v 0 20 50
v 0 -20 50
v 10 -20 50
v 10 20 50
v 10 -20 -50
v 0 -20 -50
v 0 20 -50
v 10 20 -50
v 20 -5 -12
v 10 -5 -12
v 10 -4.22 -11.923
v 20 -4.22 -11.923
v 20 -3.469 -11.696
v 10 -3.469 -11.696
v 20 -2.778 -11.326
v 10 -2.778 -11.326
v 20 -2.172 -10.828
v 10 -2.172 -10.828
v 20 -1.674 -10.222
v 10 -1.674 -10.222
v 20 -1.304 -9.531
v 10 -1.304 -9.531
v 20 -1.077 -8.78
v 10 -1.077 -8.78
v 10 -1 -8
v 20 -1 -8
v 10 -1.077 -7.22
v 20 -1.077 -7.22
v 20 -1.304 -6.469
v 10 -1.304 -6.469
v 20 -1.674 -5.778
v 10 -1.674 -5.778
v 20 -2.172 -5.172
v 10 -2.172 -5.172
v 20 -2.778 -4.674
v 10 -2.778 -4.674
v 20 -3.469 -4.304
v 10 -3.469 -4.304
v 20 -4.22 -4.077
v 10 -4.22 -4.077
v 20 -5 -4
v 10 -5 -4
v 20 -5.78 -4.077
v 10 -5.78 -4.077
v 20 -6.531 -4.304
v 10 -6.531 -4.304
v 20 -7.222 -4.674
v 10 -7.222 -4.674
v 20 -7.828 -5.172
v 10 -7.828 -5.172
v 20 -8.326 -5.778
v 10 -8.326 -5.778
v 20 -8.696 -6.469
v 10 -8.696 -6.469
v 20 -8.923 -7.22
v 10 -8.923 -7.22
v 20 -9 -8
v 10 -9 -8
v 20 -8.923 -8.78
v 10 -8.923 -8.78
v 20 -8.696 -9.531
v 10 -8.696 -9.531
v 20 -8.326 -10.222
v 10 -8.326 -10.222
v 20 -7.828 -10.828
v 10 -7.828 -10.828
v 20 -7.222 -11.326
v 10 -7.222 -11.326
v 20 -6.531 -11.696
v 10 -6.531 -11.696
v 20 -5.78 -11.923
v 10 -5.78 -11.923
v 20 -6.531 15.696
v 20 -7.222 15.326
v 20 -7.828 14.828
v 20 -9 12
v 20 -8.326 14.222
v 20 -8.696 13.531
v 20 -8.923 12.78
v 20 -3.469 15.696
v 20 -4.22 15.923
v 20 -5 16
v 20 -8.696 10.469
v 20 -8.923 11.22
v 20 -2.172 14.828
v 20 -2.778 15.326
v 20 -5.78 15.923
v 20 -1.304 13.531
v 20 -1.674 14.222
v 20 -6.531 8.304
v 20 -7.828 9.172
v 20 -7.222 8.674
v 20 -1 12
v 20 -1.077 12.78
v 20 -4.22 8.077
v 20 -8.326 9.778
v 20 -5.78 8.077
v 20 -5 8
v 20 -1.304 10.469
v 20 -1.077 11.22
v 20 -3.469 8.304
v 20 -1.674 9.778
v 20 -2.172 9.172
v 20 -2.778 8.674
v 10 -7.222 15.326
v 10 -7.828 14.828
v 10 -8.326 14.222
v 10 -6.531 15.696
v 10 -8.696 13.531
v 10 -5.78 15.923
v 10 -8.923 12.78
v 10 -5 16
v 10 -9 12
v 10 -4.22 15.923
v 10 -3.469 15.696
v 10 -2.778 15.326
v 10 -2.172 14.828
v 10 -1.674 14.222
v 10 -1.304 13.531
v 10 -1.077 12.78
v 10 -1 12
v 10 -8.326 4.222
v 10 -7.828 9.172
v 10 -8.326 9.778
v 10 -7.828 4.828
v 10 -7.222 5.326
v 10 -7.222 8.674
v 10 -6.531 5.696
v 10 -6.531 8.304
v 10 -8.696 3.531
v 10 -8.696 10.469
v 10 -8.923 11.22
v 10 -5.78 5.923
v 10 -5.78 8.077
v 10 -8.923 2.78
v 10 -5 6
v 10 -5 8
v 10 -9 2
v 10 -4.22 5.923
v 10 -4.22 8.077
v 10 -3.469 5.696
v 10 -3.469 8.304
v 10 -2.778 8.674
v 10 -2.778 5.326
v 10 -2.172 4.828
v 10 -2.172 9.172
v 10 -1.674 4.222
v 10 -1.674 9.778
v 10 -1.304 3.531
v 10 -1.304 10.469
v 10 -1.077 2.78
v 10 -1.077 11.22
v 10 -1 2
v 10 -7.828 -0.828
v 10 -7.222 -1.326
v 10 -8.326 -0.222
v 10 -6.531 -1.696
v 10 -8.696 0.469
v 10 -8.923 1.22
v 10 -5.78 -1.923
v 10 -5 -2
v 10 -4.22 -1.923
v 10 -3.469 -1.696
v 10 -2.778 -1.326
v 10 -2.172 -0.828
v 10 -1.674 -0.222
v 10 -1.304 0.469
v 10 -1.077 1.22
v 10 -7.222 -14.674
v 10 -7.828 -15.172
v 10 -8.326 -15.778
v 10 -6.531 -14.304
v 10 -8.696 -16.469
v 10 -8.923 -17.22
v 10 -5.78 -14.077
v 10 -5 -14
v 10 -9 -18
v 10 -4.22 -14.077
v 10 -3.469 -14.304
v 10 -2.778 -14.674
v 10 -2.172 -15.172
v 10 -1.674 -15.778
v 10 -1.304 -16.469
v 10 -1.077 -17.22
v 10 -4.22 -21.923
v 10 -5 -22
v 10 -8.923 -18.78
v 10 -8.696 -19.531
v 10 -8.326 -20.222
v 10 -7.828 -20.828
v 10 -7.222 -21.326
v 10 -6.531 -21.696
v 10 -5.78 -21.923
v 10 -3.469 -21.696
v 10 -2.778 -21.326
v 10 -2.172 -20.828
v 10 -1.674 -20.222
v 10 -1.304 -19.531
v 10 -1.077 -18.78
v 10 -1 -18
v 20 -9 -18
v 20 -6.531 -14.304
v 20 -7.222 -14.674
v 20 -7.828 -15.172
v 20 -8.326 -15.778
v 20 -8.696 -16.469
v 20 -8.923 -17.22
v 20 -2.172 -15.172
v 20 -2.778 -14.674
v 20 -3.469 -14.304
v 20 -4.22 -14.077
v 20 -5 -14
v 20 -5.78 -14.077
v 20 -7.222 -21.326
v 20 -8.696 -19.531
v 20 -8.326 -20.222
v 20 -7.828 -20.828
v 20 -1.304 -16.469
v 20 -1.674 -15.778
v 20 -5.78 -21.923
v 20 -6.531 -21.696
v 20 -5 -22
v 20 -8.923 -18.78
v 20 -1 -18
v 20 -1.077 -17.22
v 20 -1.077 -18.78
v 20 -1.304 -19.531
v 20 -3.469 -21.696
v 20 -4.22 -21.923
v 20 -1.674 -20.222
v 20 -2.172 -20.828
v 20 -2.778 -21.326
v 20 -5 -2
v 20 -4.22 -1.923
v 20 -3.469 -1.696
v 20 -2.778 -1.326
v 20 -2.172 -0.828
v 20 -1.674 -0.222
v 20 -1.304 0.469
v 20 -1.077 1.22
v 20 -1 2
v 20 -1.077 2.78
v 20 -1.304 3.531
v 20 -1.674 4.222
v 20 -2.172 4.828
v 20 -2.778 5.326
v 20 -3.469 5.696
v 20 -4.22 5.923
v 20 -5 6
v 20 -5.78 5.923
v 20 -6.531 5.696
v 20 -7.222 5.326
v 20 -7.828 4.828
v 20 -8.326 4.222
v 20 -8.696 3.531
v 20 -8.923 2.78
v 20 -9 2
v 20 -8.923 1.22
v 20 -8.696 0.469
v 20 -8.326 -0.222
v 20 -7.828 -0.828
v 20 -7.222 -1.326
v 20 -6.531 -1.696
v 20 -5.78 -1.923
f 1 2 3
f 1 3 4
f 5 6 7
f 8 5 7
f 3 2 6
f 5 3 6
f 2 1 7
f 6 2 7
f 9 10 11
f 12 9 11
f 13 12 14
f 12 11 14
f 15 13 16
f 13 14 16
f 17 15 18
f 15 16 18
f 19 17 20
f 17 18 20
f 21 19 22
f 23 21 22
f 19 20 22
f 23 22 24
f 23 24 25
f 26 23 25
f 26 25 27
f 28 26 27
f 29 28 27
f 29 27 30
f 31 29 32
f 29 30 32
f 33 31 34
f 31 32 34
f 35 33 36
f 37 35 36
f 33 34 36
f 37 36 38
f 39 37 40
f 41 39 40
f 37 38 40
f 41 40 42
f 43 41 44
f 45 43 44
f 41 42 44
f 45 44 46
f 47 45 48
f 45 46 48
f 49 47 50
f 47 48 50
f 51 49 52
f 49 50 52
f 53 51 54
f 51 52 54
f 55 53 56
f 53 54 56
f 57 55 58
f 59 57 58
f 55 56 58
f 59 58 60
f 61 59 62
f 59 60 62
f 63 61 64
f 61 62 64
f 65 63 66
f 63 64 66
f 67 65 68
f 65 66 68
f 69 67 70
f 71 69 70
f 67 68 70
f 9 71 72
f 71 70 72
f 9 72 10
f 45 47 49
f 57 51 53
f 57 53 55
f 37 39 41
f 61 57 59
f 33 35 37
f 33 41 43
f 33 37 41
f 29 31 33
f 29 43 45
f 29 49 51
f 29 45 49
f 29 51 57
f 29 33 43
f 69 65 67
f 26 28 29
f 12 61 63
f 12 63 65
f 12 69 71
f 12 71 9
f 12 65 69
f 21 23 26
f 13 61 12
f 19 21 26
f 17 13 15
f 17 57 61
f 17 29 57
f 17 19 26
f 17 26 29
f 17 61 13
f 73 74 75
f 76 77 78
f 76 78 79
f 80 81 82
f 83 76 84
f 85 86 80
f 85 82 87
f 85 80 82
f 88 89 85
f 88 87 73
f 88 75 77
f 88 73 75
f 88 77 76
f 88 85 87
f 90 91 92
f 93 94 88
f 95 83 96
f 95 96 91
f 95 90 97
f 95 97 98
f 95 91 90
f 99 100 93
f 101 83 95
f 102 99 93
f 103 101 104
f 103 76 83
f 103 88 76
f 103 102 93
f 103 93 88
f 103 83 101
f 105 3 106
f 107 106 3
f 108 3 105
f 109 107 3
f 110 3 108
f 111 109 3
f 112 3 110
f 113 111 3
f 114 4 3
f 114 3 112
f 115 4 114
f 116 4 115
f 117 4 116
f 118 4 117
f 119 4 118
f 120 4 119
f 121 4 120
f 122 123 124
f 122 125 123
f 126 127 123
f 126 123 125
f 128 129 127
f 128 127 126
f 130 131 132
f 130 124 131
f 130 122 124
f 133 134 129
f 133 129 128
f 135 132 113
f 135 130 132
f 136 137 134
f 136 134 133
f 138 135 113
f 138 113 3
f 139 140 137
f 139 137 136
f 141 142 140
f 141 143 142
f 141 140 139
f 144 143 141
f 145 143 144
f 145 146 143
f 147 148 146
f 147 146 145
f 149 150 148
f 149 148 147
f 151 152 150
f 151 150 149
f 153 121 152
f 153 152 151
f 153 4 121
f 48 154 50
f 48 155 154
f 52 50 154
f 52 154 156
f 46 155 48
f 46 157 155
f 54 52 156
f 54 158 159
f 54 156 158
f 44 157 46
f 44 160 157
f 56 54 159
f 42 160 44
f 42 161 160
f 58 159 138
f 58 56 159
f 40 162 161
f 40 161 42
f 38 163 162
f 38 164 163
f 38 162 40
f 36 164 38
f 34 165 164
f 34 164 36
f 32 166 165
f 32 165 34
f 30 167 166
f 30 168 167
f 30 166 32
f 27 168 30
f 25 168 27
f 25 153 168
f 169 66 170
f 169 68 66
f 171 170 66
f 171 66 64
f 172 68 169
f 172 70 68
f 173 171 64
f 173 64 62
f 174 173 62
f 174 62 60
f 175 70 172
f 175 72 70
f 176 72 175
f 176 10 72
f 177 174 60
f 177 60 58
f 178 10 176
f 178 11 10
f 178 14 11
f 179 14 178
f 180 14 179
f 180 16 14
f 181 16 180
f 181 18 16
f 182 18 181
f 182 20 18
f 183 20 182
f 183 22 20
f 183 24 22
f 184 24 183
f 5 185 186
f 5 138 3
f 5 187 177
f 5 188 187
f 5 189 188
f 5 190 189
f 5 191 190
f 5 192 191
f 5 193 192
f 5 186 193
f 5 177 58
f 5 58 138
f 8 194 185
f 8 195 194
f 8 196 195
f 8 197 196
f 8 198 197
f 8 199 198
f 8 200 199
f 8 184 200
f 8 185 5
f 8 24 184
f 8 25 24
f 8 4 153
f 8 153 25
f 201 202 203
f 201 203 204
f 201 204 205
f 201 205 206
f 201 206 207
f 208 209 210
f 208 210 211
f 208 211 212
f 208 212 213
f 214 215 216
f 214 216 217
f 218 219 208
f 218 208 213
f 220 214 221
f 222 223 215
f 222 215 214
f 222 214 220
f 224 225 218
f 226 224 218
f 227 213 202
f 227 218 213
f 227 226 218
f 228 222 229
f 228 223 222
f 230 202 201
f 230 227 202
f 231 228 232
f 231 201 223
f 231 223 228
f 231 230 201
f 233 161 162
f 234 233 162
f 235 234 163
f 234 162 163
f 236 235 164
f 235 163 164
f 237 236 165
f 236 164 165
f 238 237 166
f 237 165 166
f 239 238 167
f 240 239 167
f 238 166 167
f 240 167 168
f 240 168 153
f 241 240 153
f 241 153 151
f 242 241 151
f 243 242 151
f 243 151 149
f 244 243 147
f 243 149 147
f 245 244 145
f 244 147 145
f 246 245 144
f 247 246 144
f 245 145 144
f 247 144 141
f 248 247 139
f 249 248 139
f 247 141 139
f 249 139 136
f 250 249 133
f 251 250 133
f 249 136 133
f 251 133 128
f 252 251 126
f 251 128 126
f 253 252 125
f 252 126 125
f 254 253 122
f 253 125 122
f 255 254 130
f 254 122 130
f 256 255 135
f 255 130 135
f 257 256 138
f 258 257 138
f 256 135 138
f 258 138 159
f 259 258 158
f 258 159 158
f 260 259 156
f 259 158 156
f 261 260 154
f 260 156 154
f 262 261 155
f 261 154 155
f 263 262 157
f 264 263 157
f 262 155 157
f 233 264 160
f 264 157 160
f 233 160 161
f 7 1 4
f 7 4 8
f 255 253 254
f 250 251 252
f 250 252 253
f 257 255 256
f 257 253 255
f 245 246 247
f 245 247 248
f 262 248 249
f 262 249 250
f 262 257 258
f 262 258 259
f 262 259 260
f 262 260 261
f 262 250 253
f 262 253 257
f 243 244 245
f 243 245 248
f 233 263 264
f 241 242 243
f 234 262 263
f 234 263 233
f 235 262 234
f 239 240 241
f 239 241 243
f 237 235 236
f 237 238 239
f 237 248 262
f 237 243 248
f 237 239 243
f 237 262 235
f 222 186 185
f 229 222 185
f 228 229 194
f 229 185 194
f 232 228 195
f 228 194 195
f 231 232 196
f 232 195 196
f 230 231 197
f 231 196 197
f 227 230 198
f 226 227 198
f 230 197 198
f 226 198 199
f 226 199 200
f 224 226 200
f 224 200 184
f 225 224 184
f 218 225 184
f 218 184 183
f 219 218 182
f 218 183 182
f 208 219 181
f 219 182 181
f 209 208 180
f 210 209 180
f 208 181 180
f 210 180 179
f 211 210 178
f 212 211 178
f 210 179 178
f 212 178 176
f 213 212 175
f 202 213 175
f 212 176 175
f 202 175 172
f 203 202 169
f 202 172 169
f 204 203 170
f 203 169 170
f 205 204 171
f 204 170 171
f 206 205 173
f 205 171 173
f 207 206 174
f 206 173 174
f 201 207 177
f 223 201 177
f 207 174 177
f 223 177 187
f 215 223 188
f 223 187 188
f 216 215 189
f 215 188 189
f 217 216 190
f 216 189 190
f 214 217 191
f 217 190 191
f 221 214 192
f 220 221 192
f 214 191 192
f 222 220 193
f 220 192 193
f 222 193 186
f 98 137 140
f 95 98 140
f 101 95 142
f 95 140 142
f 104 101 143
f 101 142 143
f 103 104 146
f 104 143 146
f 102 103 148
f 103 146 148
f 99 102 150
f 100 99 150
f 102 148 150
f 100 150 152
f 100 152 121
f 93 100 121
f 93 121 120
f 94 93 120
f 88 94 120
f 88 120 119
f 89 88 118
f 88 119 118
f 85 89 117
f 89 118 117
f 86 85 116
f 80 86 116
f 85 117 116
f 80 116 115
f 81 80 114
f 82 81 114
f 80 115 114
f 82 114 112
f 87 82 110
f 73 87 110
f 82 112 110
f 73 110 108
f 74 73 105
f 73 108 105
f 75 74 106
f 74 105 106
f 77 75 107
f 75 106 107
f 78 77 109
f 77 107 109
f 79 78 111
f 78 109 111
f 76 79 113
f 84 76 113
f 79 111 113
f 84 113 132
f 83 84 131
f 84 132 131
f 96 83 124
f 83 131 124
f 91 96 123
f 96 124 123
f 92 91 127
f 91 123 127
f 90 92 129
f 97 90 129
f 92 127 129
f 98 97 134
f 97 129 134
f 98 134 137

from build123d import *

# Parameters (mm, degrees)
SKETCH1_W           = 100
SKETCH1_H           = 40
BOSS_EXTRUDE1_DEPTH = 10
SKETCH2_R           = 4
BOSS_EXTRUDE2_DEPTH = 10


with BuildPart() as part:
    # Sketch1 → Boss-Extrude1 (new body)
    with BuildSketch(Plane(origin=(0, 0, 0), x_dir=(0, 0, -1), z_dir=(1, 0, 0))):
        Rectangle(SKETCH1_W, SKETCH1_H)
    extrude(amount=BOSS_EXTRUDE1_DEPTH)

    # Sketch2 → Boss-Extrude2 (add)
    with BuildSketch(Plane(origin=(10, 0, 0), x_dir=(0, 0, -1), z_dir=(1, 0, 0))):
        with Locations((18, -5)):
            Circle(SKETCH2_R)
        with Locations((8, -5)):
            Circle(SKETCH2_R)
        with Locations((-2, -5)):
            Circle(SKETCH2_R)
        with Locations((-12, -5)):
            Circle(SKETCH2_R)
    extrude(amount=BOSS_EXTRUDE2_DEPTH)


solid = part.part
